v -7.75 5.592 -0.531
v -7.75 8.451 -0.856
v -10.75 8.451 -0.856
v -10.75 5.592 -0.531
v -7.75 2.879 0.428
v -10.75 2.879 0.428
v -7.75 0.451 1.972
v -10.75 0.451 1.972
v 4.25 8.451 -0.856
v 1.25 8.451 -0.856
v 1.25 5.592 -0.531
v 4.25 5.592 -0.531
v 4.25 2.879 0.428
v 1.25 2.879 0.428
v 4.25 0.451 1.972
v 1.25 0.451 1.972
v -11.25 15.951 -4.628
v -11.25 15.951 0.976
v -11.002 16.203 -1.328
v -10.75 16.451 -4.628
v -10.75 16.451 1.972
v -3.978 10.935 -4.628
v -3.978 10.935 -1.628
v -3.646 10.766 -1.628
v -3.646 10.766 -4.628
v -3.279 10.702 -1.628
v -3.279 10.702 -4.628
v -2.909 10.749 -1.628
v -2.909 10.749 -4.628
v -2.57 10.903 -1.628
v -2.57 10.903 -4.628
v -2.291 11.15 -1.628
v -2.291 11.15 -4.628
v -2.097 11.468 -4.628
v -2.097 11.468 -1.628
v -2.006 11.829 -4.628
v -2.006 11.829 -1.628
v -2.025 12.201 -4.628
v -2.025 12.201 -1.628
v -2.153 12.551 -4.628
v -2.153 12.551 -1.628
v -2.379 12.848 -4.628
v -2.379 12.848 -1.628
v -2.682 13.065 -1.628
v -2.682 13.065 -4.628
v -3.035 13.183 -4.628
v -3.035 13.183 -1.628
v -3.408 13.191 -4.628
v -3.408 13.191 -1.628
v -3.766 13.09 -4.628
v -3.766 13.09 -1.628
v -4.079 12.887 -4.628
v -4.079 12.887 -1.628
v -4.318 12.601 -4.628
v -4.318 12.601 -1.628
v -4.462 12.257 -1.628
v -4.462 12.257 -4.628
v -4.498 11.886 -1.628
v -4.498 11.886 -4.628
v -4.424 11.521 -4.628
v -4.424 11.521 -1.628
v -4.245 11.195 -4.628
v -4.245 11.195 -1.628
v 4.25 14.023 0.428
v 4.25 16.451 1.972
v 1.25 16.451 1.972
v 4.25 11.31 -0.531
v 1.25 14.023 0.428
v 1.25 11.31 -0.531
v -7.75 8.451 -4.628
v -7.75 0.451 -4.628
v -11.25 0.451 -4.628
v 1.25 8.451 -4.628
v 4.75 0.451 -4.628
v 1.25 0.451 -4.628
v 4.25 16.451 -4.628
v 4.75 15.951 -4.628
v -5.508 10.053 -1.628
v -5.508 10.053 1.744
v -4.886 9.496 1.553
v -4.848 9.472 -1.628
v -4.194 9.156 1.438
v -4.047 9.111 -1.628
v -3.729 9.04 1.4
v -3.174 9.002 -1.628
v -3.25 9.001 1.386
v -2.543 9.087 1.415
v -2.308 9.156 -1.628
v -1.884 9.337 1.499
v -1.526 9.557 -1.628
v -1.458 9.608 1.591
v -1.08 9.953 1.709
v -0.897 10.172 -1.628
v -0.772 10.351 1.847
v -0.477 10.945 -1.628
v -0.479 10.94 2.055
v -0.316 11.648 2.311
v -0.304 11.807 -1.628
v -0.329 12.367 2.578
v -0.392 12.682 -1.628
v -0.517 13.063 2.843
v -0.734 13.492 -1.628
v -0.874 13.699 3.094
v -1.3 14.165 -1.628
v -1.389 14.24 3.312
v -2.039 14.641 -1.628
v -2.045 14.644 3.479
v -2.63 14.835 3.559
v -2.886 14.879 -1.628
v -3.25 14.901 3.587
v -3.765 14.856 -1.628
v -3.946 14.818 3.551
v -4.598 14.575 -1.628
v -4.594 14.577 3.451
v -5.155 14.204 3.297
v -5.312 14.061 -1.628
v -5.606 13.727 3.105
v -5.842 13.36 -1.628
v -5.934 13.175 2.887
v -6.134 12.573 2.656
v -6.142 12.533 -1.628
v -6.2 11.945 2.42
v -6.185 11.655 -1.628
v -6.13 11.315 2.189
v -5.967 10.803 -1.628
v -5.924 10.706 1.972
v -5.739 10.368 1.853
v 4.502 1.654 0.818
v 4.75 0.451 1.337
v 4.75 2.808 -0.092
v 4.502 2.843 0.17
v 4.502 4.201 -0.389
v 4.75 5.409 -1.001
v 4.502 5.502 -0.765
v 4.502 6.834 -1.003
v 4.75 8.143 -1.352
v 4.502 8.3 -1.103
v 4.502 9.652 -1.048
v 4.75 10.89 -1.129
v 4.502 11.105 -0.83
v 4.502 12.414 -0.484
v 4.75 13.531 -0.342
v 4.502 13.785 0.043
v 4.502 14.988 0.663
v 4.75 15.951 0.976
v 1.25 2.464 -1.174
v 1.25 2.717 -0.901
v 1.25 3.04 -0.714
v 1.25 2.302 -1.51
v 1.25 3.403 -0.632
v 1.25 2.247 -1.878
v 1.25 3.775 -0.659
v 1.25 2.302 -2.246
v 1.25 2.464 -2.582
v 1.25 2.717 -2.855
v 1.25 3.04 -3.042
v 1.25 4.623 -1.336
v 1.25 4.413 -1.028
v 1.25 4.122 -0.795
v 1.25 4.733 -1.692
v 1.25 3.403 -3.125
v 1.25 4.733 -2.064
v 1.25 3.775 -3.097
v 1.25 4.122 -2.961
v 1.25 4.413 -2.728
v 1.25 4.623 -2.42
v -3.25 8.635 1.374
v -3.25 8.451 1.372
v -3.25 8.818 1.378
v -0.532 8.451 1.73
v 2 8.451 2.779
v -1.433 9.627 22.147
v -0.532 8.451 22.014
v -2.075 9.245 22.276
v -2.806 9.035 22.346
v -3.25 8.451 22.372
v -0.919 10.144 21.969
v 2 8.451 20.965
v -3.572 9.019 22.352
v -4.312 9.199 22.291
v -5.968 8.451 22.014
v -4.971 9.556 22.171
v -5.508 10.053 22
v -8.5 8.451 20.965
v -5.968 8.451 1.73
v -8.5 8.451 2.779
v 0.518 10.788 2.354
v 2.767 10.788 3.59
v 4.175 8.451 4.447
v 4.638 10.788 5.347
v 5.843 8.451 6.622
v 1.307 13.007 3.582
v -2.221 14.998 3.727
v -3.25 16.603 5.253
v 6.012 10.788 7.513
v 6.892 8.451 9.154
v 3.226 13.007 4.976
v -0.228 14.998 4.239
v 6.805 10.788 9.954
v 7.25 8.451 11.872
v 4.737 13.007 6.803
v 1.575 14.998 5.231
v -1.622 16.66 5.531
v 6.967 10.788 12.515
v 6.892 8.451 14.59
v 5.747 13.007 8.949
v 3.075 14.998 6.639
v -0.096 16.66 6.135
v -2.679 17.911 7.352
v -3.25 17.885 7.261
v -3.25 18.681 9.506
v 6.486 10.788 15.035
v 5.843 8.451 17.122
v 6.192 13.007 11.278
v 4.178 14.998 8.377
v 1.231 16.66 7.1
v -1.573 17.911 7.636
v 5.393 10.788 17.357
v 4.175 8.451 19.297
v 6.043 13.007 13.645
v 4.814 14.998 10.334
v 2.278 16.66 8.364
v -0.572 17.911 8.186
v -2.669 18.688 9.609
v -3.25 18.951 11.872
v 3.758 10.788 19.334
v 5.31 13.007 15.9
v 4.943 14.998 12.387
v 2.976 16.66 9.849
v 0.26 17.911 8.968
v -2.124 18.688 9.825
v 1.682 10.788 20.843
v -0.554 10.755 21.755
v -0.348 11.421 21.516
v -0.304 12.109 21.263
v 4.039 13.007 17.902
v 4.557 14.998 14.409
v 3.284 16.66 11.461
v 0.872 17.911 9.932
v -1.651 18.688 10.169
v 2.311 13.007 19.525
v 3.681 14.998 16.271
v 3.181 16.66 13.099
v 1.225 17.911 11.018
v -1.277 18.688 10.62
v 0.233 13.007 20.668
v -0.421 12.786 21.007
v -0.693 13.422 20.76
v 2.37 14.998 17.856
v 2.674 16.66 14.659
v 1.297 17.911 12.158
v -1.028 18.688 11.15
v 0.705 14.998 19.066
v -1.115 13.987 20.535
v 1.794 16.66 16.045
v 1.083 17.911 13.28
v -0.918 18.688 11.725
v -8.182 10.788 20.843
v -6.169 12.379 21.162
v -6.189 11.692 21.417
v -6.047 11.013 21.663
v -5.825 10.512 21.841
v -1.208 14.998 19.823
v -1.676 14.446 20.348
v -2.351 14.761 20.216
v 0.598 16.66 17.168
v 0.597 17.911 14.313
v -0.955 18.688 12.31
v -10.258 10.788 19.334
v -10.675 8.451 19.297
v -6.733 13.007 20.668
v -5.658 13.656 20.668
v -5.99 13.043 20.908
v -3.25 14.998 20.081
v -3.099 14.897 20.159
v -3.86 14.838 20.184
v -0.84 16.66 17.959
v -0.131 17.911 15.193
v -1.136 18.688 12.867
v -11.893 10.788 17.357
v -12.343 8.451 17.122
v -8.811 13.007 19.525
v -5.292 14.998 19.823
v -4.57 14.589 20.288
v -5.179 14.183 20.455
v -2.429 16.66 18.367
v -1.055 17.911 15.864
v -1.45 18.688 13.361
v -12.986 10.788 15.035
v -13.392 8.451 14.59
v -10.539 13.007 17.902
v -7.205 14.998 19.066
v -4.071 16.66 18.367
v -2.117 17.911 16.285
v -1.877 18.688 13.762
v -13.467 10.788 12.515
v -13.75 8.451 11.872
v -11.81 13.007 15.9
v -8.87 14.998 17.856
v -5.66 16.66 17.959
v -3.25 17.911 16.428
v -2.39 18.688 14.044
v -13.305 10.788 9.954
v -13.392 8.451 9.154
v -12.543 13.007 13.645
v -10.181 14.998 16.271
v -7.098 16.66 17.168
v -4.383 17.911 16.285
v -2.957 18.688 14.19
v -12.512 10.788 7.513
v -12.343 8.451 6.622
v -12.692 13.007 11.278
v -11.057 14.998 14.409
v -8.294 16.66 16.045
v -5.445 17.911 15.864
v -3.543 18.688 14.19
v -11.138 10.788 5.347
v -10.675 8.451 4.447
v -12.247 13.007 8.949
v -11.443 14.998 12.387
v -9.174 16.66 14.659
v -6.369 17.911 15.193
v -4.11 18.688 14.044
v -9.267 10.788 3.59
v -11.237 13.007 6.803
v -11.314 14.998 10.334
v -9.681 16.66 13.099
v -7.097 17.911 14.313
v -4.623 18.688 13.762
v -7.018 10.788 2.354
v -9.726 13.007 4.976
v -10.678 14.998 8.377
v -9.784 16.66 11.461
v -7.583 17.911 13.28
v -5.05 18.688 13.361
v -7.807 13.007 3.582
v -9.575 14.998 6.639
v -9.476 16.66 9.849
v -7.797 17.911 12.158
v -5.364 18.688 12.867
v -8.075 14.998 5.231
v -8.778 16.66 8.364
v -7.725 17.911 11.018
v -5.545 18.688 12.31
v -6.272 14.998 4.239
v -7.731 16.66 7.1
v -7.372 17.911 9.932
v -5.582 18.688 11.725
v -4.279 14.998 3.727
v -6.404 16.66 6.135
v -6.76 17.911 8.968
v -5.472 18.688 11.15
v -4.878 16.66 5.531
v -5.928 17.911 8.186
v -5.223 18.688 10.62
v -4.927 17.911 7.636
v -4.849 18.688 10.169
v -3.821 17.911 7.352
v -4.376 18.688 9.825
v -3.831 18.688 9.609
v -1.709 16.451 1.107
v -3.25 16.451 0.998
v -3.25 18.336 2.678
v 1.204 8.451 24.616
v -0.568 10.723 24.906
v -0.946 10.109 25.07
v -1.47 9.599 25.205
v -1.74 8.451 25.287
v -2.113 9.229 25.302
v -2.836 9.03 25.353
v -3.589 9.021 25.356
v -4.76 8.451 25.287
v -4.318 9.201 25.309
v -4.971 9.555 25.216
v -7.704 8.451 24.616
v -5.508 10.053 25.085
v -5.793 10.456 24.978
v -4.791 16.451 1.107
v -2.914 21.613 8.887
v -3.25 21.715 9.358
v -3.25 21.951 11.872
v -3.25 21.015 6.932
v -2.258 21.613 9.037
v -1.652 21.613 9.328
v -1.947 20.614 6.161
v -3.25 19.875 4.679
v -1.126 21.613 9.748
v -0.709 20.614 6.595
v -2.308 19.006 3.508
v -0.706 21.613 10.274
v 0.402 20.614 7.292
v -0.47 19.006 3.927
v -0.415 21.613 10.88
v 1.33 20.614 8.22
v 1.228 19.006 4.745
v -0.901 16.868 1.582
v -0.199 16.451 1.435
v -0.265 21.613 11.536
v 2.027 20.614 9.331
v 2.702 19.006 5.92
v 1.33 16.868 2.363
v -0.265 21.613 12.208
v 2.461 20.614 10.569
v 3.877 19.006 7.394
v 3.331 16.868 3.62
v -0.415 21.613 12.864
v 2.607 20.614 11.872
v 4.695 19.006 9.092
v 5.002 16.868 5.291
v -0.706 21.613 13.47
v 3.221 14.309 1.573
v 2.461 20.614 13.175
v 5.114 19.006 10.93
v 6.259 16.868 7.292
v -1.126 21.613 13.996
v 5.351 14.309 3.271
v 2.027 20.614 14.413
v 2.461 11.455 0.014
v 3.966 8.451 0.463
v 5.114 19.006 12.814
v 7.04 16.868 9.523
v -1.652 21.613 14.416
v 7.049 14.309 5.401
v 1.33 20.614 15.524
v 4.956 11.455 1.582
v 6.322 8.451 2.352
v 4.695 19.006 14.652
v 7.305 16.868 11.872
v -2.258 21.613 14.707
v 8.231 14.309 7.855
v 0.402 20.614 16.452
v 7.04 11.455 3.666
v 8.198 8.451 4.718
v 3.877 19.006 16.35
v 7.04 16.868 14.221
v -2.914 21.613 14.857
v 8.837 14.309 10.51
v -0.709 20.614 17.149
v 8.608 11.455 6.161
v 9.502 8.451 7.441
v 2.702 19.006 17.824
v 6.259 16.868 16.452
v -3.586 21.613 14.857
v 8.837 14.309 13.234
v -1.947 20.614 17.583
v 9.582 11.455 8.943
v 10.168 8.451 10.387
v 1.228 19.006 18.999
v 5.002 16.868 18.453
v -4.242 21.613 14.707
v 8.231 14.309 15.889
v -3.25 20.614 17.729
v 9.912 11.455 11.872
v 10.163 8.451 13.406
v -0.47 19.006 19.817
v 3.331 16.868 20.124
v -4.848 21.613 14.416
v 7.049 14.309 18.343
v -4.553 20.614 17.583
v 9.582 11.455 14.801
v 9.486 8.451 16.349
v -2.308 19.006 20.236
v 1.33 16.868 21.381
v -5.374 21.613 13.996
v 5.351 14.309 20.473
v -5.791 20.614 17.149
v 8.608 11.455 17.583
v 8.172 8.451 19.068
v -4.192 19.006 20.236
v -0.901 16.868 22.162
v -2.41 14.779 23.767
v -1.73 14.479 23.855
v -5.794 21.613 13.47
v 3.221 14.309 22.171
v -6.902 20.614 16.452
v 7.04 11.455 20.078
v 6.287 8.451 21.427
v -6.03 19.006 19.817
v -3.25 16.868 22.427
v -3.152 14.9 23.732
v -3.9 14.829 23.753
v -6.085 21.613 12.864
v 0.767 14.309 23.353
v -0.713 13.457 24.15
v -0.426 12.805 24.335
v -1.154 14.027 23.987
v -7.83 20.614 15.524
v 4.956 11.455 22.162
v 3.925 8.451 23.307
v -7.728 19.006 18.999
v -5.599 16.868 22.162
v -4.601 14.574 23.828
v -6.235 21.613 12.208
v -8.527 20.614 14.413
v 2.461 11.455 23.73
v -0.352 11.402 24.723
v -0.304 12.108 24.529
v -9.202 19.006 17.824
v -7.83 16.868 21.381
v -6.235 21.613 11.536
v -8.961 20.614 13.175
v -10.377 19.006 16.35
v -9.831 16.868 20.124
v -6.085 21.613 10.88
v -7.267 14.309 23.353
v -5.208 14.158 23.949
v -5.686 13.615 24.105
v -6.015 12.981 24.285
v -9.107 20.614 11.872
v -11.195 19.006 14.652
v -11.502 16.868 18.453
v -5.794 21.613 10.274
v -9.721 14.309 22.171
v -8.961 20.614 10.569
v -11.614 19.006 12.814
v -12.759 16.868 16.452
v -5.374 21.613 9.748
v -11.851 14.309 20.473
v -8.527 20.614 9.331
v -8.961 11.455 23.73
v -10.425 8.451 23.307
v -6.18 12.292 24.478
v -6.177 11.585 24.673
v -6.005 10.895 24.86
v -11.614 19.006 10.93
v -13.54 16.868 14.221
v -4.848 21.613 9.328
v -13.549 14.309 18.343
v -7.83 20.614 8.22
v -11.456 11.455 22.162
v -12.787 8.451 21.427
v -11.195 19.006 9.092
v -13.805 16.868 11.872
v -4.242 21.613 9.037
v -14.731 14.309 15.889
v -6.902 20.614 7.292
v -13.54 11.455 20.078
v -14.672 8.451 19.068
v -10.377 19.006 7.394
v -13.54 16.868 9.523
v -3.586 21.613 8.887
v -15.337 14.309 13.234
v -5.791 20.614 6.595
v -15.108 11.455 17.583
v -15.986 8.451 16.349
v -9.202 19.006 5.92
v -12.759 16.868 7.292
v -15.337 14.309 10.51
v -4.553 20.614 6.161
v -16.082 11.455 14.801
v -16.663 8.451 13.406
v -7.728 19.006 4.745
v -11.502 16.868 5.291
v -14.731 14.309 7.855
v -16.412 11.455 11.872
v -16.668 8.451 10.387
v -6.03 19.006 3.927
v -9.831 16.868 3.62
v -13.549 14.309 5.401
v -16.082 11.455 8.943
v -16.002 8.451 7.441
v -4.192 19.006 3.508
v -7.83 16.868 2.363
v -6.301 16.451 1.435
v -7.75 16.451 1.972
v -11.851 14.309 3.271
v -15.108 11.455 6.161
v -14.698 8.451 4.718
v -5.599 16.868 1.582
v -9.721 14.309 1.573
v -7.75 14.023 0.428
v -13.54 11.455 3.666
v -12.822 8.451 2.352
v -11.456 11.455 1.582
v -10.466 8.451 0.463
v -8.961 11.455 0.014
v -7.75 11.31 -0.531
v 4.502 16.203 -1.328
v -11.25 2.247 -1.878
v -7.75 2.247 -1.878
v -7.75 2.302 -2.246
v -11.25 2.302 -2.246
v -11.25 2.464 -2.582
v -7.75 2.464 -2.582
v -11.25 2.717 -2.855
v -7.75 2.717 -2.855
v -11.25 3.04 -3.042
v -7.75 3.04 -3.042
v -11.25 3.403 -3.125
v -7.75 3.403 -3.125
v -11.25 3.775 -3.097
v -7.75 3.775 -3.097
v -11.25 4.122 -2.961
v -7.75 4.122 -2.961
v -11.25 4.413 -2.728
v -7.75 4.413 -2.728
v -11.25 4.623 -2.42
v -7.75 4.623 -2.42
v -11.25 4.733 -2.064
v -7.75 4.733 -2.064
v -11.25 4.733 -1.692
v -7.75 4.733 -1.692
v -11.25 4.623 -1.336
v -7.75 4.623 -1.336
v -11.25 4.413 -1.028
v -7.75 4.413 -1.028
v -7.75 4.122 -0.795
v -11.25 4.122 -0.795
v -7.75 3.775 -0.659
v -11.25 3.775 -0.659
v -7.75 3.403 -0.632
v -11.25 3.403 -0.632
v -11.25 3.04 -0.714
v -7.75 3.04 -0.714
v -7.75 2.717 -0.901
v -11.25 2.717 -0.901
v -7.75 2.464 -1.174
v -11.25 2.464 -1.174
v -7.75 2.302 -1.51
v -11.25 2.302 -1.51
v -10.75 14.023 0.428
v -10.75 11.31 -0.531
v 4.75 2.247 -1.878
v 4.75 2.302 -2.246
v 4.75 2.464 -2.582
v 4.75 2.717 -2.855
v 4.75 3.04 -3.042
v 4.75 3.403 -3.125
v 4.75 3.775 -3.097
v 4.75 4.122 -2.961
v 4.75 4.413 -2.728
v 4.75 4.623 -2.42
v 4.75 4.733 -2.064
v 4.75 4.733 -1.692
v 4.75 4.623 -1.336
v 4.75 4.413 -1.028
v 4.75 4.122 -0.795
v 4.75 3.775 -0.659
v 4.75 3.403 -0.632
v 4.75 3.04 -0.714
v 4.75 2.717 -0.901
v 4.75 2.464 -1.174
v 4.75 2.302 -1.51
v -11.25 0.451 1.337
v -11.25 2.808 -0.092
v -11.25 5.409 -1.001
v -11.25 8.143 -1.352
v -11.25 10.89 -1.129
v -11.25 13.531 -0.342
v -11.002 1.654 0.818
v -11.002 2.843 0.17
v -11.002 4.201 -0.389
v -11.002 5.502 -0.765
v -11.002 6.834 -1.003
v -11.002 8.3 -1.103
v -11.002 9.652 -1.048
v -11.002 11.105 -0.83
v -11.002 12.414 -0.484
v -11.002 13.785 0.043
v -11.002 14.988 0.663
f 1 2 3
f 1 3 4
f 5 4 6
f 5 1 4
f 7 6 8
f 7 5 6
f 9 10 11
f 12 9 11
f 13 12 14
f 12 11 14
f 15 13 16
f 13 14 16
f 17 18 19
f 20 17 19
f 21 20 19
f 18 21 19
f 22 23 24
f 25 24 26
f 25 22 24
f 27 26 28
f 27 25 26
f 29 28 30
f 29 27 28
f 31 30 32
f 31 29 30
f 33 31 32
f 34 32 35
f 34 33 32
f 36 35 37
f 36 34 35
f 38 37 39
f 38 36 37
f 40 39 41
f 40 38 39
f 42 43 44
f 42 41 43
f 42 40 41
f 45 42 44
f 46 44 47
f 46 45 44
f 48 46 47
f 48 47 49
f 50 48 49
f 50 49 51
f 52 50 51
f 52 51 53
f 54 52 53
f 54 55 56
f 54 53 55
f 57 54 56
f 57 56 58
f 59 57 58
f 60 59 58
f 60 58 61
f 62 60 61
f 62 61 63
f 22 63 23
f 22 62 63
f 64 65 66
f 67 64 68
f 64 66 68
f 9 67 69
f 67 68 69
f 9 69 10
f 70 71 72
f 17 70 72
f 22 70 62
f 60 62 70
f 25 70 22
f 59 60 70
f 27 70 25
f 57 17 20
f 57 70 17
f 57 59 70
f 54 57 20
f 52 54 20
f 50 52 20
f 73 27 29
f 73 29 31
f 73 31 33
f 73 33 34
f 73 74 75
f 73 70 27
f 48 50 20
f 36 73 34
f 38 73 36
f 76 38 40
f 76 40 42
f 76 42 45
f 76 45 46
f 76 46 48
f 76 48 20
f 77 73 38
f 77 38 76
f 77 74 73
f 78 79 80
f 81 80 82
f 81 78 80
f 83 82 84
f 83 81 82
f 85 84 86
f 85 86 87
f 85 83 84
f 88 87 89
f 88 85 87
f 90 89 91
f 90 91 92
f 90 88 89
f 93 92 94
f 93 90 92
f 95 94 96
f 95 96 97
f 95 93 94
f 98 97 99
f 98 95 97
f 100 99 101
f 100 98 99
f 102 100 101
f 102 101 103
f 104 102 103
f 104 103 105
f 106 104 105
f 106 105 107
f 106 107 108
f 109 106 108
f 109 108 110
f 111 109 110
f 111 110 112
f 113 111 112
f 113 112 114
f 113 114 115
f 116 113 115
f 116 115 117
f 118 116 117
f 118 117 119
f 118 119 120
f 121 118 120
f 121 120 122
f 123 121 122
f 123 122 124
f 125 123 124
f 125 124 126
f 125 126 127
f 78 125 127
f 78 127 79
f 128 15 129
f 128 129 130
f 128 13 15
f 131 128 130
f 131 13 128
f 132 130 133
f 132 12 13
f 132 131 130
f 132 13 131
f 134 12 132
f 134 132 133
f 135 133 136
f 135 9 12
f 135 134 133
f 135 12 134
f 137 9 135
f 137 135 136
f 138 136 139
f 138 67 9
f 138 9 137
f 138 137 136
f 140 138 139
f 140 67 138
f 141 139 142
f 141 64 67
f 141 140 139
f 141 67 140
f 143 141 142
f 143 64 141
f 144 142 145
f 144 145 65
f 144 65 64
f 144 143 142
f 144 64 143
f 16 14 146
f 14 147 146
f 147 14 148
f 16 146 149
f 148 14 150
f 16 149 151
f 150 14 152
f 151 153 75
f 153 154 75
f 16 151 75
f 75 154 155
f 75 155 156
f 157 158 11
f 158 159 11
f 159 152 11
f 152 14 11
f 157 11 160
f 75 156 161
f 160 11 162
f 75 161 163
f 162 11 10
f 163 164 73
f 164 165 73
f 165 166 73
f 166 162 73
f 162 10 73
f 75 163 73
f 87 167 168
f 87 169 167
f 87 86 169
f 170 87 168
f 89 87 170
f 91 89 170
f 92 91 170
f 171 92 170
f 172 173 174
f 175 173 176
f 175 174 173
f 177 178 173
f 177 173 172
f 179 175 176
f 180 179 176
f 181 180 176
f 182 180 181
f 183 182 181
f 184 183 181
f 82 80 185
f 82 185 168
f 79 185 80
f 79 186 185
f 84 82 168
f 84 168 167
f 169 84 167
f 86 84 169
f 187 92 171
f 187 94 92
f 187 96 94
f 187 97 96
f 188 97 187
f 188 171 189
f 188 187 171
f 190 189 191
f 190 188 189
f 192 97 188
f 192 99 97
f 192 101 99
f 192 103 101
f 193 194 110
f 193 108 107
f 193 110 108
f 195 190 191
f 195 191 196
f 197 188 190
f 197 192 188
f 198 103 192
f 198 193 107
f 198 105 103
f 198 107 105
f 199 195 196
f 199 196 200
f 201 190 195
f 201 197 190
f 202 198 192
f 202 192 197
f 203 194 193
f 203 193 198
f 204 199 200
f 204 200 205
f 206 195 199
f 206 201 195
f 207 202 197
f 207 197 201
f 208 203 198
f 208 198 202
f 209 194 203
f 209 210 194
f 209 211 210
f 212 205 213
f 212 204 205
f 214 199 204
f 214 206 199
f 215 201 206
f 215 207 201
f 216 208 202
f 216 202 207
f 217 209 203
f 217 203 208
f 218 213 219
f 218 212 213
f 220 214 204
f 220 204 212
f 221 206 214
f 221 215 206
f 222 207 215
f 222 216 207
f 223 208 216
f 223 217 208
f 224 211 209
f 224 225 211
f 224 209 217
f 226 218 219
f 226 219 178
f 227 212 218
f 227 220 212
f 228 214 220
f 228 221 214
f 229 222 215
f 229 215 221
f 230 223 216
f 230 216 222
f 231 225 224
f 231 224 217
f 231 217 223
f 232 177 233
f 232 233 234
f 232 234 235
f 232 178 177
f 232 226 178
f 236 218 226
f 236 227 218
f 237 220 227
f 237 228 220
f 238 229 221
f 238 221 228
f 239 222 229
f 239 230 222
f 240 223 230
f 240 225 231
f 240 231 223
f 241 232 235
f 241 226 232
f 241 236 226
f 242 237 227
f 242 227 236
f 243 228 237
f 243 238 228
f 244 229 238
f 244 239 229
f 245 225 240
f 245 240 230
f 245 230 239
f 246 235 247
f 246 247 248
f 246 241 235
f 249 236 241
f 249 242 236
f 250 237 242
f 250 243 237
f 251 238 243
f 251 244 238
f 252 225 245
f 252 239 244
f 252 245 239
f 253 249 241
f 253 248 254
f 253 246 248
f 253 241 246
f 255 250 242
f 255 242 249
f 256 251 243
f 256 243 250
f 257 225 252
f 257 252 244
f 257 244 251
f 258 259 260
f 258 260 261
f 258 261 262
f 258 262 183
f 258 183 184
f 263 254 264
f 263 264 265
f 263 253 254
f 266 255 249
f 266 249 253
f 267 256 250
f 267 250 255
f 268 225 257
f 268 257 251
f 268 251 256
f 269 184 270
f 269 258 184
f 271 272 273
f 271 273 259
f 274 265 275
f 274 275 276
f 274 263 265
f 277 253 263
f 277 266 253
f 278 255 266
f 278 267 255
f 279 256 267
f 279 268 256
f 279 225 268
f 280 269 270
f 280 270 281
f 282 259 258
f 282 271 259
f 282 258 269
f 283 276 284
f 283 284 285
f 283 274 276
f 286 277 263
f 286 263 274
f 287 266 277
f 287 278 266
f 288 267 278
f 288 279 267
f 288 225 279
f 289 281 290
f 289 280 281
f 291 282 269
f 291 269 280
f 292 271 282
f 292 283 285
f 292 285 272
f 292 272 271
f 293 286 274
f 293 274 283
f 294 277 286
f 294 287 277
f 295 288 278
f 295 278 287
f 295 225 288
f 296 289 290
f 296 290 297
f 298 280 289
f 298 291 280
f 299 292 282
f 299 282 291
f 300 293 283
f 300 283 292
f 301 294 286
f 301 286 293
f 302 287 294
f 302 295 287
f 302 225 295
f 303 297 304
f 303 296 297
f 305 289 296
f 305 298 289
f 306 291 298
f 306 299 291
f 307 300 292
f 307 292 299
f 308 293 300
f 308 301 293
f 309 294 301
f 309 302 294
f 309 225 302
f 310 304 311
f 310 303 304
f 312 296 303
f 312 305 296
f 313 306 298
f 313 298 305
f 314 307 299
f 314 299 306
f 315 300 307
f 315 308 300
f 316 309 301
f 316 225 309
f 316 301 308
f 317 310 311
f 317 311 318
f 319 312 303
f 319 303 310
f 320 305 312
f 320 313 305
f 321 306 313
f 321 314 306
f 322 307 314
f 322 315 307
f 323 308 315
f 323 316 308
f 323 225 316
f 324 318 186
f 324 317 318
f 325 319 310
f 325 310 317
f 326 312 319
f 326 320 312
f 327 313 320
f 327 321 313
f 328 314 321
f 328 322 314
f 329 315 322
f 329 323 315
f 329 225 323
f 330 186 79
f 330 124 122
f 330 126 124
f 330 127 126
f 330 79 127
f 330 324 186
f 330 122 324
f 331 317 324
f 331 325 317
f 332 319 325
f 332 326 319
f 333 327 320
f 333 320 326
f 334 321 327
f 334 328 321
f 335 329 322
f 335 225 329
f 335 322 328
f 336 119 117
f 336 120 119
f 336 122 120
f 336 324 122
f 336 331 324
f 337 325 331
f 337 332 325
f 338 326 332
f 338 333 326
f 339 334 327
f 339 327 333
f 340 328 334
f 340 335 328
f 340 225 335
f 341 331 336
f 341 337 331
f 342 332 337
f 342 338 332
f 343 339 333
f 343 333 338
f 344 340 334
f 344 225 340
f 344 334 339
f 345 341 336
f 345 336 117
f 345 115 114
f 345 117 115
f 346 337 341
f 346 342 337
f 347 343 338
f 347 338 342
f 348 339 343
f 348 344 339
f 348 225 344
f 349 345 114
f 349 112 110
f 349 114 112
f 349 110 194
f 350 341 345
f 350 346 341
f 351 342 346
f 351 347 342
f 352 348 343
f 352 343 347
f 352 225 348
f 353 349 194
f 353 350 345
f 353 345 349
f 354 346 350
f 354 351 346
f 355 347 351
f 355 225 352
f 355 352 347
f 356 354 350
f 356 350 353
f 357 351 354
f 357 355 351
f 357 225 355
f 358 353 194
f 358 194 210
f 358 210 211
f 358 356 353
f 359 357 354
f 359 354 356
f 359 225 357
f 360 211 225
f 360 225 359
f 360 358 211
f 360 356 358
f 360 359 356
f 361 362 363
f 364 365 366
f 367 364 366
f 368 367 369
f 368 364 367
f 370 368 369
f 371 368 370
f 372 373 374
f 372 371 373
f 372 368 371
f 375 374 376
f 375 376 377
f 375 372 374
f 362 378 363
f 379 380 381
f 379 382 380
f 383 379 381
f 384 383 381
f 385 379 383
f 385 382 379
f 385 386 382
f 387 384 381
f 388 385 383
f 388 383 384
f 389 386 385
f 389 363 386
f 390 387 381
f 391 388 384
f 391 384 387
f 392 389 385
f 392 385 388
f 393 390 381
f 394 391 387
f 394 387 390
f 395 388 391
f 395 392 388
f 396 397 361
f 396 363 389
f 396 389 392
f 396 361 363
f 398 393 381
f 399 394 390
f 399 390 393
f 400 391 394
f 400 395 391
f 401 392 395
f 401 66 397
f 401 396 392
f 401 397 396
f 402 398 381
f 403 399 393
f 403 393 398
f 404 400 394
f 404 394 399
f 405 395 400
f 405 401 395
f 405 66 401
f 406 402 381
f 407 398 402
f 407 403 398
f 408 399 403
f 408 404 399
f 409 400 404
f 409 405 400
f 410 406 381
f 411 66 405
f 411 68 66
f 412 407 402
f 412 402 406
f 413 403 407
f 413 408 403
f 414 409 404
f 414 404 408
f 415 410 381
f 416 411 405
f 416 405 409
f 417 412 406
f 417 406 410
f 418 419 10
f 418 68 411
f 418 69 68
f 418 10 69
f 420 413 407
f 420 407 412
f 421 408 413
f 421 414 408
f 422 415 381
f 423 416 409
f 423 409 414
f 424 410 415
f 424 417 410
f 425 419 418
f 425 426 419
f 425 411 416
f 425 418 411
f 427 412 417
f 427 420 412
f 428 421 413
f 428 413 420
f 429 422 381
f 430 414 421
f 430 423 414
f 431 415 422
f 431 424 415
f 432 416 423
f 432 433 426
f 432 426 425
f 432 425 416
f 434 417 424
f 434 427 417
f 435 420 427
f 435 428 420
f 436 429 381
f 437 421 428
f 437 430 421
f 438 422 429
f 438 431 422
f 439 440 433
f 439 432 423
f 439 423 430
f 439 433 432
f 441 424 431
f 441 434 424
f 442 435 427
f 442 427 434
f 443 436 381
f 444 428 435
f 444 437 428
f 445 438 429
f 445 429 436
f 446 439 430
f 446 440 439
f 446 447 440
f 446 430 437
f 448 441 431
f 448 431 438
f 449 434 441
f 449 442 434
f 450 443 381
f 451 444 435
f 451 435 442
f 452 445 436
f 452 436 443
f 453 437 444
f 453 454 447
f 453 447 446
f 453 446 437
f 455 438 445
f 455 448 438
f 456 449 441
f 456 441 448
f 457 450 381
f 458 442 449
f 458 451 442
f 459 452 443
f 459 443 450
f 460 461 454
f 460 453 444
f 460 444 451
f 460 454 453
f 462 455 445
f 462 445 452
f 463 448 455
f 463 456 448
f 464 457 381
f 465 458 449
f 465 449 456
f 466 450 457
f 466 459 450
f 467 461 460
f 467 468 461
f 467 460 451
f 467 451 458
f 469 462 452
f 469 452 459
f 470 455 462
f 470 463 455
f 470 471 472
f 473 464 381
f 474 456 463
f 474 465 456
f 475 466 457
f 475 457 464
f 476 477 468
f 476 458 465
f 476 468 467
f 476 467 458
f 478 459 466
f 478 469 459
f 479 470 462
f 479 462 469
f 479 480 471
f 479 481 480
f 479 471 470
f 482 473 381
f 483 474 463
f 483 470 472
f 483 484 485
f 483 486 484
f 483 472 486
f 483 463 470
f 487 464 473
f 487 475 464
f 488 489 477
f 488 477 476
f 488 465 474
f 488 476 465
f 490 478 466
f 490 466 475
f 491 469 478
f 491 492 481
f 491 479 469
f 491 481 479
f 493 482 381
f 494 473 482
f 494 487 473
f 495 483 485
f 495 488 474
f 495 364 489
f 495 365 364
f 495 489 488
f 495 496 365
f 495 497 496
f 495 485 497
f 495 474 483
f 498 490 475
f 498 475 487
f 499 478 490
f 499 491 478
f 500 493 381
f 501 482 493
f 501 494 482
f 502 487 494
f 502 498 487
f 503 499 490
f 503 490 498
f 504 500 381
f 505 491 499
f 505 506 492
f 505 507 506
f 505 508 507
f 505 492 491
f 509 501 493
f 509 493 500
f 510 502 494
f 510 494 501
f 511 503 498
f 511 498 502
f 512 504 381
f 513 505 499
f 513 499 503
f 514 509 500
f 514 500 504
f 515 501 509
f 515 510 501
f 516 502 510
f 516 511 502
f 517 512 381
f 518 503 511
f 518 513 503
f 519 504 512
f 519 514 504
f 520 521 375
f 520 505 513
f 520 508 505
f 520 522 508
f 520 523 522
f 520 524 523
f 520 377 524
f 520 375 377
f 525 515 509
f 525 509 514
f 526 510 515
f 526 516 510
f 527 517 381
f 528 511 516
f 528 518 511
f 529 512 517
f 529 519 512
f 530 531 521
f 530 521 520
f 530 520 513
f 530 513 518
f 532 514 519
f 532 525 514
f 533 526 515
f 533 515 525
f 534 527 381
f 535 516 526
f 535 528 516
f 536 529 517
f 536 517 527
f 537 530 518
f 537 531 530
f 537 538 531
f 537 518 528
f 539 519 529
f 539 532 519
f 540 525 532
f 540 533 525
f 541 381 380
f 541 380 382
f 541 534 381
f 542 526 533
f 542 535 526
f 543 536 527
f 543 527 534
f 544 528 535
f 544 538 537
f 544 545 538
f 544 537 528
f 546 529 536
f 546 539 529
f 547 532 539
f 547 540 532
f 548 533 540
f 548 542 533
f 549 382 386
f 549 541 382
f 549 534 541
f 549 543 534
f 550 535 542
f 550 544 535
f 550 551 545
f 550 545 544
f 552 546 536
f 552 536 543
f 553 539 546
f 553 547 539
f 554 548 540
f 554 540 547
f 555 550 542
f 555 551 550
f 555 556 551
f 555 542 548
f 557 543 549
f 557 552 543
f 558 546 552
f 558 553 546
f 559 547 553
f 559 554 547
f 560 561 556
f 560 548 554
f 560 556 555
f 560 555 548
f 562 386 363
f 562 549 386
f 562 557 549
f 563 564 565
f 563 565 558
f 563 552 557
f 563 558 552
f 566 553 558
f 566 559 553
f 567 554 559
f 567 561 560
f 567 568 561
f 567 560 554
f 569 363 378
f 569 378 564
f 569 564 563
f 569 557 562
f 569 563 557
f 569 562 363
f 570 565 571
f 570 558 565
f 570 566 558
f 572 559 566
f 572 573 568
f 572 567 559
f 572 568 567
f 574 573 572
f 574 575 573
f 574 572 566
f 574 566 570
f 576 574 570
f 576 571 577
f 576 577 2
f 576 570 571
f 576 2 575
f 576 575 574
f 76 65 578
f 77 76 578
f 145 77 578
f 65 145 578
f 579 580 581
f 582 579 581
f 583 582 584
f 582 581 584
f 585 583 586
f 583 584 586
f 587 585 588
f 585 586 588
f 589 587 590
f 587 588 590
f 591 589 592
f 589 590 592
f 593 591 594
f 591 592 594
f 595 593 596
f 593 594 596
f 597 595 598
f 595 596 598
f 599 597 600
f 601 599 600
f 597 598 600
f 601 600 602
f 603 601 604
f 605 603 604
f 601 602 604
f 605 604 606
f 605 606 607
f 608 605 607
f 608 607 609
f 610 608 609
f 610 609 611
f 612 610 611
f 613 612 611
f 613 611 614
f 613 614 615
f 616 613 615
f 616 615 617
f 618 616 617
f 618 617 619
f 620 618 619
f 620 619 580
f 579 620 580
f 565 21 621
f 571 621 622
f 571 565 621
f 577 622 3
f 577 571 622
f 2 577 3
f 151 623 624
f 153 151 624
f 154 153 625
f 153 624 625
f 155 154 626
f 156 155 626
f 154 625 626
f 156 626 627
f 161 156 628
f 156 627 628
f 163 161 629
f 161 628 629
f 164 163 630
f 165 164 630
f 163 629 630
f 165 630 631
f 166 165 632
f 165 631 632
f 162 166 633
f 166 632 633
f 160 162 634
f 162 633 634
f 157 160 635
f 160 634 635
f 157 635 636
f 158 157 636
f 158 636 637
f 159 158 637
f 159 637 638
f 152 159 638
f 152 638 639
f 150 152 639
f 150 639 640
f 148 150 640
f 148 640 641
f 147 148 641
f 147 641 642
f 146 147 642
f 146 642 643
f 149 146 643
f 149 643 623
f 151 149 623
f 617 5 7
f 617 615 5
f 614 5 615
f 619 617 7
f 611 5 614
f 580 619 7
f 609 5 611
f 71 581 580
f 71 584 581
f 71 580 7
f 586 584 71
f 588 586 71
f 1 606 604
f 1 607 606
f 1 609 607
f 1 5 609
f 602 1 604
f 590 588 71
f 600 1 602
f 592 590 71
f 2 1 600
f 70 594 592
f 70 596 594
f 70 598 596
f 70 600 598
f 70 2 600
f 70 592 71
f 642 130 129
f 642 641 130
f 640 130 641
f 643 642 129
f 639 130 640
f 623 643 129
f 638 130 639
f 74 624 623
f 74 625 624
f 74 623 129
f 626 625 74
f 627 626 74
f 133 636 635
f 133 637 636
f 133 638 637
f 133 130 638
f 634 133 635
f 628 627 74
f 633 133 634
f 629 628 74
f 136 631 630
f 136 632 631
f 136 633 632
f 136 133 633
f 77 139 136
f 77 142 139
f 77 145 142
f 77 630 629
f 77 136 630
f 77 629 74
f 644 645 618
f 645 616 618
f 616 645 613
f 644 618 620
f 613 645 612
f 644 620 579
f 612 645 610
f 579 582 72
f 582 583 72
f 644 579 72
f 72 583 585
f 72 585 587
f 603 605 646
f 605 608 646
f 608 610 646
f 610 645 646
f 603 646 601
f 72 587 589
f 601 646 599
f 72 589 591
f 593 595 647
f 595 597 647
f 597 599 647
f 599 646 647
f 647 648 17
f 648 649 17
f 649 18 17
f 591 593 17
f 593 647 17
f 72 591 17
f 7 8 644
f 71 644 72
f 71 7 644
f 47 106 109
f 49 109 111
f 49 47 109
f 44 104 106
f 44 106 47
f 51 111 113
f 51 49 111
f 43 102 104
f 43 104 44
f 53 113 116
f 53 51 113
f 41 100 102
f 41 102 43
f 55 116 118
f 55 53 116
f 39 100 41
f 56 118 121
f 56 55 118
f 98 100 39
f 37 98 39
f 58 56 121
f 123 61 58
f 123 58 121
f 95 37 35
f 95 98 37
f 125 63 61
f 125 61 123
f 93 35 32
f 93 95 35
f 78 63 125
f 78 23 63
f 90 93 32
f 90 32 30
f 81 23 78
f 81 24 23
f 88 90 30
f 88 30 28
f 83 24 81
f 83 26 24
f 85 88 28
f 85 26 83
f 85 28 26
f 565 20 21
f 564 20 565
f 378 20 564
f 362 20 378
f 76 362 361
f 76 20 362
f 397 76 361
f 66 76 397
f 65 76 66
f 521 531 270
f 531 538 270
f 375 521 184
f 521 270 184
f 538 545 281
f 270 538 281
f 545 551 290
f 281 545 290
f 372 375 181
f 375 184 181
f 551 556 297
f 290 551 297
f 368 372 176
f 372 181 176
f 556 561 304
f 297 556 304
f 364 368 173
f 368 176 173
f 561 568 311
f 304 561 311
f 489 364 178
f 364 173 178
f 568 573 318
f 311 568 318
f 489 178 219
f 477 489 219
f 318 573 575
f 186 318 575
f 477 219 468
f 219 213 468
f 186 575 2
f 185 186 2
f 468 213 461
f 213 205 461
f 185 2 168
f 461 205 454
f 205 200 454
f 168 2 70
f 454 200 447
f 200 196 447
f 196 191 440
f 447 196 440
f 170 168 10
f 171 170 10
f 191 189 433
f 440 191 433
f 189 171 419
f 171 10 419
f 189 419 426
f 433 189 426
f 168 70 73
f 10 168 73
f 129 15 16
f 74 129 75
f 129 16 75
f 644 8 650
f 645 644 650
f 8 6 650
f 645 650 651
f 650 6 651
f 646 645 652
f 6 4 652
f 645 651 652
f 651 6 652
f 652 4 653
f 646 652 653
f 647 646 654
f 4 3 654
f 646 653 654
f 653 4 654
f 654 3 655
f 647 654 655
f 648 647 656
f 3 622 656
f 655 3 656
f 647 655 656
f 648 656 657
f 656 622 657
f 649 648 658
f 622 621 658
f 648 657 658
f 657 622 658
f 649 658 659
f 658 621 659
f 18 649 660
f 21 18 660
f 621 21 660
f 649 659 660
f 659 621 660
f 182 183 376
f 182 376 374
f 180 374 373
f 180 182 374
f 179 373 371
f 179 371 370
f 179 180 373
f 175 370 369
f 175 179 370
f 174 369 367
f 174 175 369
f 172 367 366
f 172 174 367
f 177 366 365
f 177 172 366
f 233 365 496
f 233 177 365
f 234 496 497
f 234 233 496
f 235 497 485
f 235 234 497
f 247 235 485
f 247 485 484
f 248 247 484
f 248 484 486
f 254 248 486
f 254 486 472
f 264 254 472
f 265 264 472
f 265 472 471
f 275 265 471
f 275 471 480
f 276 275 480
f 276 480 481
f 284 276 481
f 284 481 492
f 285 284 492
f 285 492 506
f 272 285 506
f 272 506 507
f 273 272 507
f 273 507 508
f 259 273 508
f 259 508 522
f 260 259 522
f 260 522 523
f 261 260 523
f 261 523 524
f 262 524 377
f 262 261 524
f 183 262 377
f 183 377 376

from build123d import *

# Parameters (mm, degrees)
BOSS_EXTRUDE1_REACH      = 42.773
BOSS_EXTRUDE1_END_RADIUS = 13.5
SKETCH3_W                = 9
SKETCH3_H                = 8
SKETCH3_R                = 1.25
SKETCH4_R                = 2.95
CUT_EXTRUDE1_DEPTH       = 39.618907907
BOSS_EXTRUDE2_DEPTH      = 3.5
FILLET1_SIZE             = 0.5
FILLET1_OF_MIRROR1_SIZE  = 0.5
SKETCH6_R                = 1.25
CUT_EXTRUDE2_DEPTH       = 40.847777024


with BuildPart() as part:
    # Sketch2 → Revolve1 (revolve)
    with BuildSketch(Plane.ZY.offset(3.25)):
        with BuildLine():
            Line((11.871988211, 18.951253904), (11.871988211, 21.951253904))
            ThreePointArc((11.871988211, 21.951253904), (2.326046665, 17.99719545), (-1.628011789, 8.451253904))
            Line((-1.628011789, 8.451253904), (1.371988211, 8.451253904))
            ThreePointArc((1.371988211, 8.451253904), (4.447367009, 15.875875106), (11.871988211, 18.951253904))
        make_face()
    revolve(axis=Axis((-3.25, 21.951253904, 11.871988211), (0, -1, 0)))

    # Boss-Extrude1: up to this sphere (the profile starts outside it)
    boss_extrude1_end = Location((-3.25, 8.451253904, 11.871988211)) * Sphere(BOSS_EXTRUDE1_END_RADIUS, mode=Mode.PRIVATE)
    # Sketch3 → Boss-Extrude1 (add, up to the surface)
    with BuildSketch(Plane.XY.offset(-4.628011789), mode=Mode.PRIVATE) as boss_extrude1_sk1:
        with Locations((-3.25, 12.451253904)):
            Rectangle(SKETCH3_W, SKETCH3_H)
        with Locations(Location((-3.25, 11.951253904, 0), (0, 0, 234.39930335))):
            Circle(SKETCH3_R, mode=Mode.SUBTRACT)
    boss_extrude1_tool1 = extrude(boss_extrude1_sk1.sketch, amount=BOSS_EXTRUDE1_REACH, mode=Mode.PRIVATE) - boss_extrude1_end
    add(boss_extrude1_tool1.solids().sort_by_distance((-3.25, 8.57167, -4.628012))[0])

    # Sketch4 → Cut-Extrude1 (cut, through all)
    with BuildSketch(Plane.XY.offset(-1.628011789)):
        with Locations(Location((-3.25, 11.951253904, 0), (0, 0, 220.0479249))):
            Circle(SKETCH4_R)
    extrude(amount=CUT_EXTRUDE1_DEPTH, mode=Mode.SUBTRACT)

    # Sketch5 → Boss-Extrude2 (add)
    with BuildSketch(Plane(origin=(1.25, 0, 0), x_dir=(0, 0, -1), z_dir=(1, 0, 0))):
        with BuildLine():
            Line((4.628011789, 16.451253904), (-1.972493274, 16.451253904))
            ThreePointArc((-1.972493274, 16.451253904), (0.128011789, 12.693894591), (0.85593385, 8.451253904))
            ThreePointArc((0.85593385, 8.451253904), (0.128011789, 4.208613217), (-1.972493274, 0.451253904))
            Line((-1.972493274, 0.451253904), (4.628011789, 0.451253904))
            Line((4.628011789, 0.451253904), (4.628011789, 16.451253904))
        make_face()
    boss_extrude2 = extrude(amount=BOSS_EXTRUDE2_DEPTH)

    # Fillet1
    # a fillet whose section is not a circle: 0.5 mm, written as the material it takes off along each edge
    with BuildSketch(Plane(origin=(4.75, 16.451253904, -5.878011789), x_dir=(0, -1, 0), z_dir=(0, 0, 1))) as fillet1_piece_1:
        with BuildLine():
            Bezier((FILLET1_SIZE, 0), (0, 0), (0, -FILLET1_SIZE), weights=[1, 0.007071068, 1])
            Line((0, -FILLET1_SIZE), (0, 0))
            Line((0, 0), (FILLET1_SIZE, 0))
        make_face()
    extrude(amount=9.100505063, mode=Mode.SUBTRACT)
    with BuildSketch(Plane(origin=(4.75, 8.451253904, 11.871988211), x_dir=(0, -0.701793953553333, -0.7123799876161475), z_dir=(0, -0.7123799876161475, 0.701793953553333))) as fillet1_piece_2:
        with BuildLine():
            Bezier((12.727922061 + FILLET1_SIZE, 0), (12.727922061, 0), (12.727922061, -FILLET1_SIZE), weights=[1, 0.007071068, 1])
            Line((12.727922061, -FILLET1_SIZE), (12.727922061, 0))
            Line((12.727922061, 0), (12.727922061 + FILLET1_SIZE, 0))
        make_face()
    revolve(axis=Axis((4.75, 8.451253904, 11.871988211), (1, 0, 0)), revolution_arc=89.142221862, mode=Mode.SUBTRACT)

    # Mirror1: Boss-Extrude2 across plane
    add(boss_extrude2.mirror(Plane.ZY.offset(3.25)))

    # Fillet1 of Mirror1
    # a fillet whose section is not a circle: 0.5 mm, written as the material it takes off along each edge
    with BuildSketch(Plane(origin=(-11.25, 16.451253904, -5.878011789), x_dir=(1, 0, 0), z_dir=(0, 0, 1))) as fillet1_of_mirror1_piece_1:
        with BuildLine():
            Bezier((FILLET1_OF_MIRROR1_SIZE, 0), (0, 0), (0, -FILLET1_OF_MIRROR1_SIZE), weights=[1, 0.007071068, 1])
            Line((0, -FILLET1_OF_MIRROR1_SIZE), (0, 0))
            Line((0, 0), (FILLET1_OF_MIRROR1_SIZE, 0))
        make_face()
    extrude(amount=9.100505063, mode=Mode.SUBTRACT)
    with BuildSketch(Plane(origin=(-11.25, 8.451253904, 11.871988211), x_dir=(9.769464187365758e-15, -0.701793953553333, -0.7123799876161475), z_dir=(9.869955665254962e-15, -0.7123799876161475, 0.701793953553333))) as fillet1_of_mirror1_piece_2:
        with BuildLine():
            Bezier((12.727922061 + FILLET1_OF_MIRROR1_SIZE, 0), (12.727922061, 0), (12.727922061, FILLET1_OF_MIRROR1_SIZE), weights=[1, 0.007071068, 1])
            Line((12.727922061, FILLET1_OF_MIRROR1_SIZE), (12.727922061, 0))
            Line((12.727922061, 0), (12.727922061 + FILLET1_OF_MIRROR1_SIZE, 0))
        make_face()
    revolve(axis=Axis((-11.25, 8.451253904, 11.871988211), (1, 0, 0)), revolution_arc=89.142221862, mode=Mode.SUBTRACT)

    # Sketch6 → Cut-Extrude2 (cut, through all)
    with BuildSketch(Plane(origin=(4.75, 0, 0), x_dir=(0, 0, -1), z_dir=(1, 0, 0))):
        with Locations(Location((1.878011789, 3.496708449, 0), (0, 0, 270))):
            Circle(SKETCH6_R)
    extrude(amount=-CUT_EXTRUDE2_DEPTH, mode=Mode.SUBTRACT)


solid = part.part
